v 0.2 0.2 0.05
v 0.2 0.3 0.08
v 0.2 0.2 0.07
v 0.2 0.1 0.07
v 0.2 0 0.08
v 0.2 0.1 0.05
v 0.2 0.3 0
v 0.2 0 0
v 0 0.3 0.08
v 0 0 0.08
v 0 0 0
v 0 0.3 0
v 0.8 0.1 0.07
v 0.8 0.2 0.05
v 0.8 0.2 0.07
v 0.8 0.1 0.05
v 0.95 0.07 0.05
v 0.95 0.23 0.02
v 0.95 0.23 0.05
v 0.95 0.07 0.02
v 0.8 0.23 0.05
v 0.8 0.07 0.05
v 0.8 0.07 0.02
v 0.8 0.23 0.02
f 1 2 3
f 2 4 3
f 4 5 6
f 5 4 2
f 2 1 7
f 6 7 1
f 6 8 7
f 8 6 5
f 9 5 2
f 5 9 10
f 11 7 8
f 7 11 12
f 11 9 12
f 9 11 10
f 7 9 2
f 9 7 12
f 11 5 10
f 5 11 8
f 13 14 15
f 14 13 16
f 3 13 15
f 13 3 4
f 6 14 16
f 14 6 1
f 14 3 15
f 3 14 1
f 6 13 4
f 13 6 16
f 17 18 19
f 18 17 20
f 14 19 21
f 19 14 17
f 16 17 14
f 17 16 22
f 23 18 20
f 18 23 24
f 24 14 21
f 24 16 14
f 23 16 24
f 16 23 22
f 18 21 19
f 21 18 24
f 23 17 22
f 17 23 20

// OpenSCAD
// FR : géométrie illustrative, unités mm, fonction non validée.
// EN: illustrative geometry, mm units, unvalidated function.
// ES: geometría ilustrativa, unidades mm, función no validada.
scale([1, 1, 1]) {
union() {
  cube([0.2, 0.3, 0.08]);
  translate([0.2, 0.1, 0.05]) cube([0.6, 0.1, 0.02]);
  translate([0.8, 0.07, 0.02]) cube([0.15, 0.16, 0.03]);
}
}
